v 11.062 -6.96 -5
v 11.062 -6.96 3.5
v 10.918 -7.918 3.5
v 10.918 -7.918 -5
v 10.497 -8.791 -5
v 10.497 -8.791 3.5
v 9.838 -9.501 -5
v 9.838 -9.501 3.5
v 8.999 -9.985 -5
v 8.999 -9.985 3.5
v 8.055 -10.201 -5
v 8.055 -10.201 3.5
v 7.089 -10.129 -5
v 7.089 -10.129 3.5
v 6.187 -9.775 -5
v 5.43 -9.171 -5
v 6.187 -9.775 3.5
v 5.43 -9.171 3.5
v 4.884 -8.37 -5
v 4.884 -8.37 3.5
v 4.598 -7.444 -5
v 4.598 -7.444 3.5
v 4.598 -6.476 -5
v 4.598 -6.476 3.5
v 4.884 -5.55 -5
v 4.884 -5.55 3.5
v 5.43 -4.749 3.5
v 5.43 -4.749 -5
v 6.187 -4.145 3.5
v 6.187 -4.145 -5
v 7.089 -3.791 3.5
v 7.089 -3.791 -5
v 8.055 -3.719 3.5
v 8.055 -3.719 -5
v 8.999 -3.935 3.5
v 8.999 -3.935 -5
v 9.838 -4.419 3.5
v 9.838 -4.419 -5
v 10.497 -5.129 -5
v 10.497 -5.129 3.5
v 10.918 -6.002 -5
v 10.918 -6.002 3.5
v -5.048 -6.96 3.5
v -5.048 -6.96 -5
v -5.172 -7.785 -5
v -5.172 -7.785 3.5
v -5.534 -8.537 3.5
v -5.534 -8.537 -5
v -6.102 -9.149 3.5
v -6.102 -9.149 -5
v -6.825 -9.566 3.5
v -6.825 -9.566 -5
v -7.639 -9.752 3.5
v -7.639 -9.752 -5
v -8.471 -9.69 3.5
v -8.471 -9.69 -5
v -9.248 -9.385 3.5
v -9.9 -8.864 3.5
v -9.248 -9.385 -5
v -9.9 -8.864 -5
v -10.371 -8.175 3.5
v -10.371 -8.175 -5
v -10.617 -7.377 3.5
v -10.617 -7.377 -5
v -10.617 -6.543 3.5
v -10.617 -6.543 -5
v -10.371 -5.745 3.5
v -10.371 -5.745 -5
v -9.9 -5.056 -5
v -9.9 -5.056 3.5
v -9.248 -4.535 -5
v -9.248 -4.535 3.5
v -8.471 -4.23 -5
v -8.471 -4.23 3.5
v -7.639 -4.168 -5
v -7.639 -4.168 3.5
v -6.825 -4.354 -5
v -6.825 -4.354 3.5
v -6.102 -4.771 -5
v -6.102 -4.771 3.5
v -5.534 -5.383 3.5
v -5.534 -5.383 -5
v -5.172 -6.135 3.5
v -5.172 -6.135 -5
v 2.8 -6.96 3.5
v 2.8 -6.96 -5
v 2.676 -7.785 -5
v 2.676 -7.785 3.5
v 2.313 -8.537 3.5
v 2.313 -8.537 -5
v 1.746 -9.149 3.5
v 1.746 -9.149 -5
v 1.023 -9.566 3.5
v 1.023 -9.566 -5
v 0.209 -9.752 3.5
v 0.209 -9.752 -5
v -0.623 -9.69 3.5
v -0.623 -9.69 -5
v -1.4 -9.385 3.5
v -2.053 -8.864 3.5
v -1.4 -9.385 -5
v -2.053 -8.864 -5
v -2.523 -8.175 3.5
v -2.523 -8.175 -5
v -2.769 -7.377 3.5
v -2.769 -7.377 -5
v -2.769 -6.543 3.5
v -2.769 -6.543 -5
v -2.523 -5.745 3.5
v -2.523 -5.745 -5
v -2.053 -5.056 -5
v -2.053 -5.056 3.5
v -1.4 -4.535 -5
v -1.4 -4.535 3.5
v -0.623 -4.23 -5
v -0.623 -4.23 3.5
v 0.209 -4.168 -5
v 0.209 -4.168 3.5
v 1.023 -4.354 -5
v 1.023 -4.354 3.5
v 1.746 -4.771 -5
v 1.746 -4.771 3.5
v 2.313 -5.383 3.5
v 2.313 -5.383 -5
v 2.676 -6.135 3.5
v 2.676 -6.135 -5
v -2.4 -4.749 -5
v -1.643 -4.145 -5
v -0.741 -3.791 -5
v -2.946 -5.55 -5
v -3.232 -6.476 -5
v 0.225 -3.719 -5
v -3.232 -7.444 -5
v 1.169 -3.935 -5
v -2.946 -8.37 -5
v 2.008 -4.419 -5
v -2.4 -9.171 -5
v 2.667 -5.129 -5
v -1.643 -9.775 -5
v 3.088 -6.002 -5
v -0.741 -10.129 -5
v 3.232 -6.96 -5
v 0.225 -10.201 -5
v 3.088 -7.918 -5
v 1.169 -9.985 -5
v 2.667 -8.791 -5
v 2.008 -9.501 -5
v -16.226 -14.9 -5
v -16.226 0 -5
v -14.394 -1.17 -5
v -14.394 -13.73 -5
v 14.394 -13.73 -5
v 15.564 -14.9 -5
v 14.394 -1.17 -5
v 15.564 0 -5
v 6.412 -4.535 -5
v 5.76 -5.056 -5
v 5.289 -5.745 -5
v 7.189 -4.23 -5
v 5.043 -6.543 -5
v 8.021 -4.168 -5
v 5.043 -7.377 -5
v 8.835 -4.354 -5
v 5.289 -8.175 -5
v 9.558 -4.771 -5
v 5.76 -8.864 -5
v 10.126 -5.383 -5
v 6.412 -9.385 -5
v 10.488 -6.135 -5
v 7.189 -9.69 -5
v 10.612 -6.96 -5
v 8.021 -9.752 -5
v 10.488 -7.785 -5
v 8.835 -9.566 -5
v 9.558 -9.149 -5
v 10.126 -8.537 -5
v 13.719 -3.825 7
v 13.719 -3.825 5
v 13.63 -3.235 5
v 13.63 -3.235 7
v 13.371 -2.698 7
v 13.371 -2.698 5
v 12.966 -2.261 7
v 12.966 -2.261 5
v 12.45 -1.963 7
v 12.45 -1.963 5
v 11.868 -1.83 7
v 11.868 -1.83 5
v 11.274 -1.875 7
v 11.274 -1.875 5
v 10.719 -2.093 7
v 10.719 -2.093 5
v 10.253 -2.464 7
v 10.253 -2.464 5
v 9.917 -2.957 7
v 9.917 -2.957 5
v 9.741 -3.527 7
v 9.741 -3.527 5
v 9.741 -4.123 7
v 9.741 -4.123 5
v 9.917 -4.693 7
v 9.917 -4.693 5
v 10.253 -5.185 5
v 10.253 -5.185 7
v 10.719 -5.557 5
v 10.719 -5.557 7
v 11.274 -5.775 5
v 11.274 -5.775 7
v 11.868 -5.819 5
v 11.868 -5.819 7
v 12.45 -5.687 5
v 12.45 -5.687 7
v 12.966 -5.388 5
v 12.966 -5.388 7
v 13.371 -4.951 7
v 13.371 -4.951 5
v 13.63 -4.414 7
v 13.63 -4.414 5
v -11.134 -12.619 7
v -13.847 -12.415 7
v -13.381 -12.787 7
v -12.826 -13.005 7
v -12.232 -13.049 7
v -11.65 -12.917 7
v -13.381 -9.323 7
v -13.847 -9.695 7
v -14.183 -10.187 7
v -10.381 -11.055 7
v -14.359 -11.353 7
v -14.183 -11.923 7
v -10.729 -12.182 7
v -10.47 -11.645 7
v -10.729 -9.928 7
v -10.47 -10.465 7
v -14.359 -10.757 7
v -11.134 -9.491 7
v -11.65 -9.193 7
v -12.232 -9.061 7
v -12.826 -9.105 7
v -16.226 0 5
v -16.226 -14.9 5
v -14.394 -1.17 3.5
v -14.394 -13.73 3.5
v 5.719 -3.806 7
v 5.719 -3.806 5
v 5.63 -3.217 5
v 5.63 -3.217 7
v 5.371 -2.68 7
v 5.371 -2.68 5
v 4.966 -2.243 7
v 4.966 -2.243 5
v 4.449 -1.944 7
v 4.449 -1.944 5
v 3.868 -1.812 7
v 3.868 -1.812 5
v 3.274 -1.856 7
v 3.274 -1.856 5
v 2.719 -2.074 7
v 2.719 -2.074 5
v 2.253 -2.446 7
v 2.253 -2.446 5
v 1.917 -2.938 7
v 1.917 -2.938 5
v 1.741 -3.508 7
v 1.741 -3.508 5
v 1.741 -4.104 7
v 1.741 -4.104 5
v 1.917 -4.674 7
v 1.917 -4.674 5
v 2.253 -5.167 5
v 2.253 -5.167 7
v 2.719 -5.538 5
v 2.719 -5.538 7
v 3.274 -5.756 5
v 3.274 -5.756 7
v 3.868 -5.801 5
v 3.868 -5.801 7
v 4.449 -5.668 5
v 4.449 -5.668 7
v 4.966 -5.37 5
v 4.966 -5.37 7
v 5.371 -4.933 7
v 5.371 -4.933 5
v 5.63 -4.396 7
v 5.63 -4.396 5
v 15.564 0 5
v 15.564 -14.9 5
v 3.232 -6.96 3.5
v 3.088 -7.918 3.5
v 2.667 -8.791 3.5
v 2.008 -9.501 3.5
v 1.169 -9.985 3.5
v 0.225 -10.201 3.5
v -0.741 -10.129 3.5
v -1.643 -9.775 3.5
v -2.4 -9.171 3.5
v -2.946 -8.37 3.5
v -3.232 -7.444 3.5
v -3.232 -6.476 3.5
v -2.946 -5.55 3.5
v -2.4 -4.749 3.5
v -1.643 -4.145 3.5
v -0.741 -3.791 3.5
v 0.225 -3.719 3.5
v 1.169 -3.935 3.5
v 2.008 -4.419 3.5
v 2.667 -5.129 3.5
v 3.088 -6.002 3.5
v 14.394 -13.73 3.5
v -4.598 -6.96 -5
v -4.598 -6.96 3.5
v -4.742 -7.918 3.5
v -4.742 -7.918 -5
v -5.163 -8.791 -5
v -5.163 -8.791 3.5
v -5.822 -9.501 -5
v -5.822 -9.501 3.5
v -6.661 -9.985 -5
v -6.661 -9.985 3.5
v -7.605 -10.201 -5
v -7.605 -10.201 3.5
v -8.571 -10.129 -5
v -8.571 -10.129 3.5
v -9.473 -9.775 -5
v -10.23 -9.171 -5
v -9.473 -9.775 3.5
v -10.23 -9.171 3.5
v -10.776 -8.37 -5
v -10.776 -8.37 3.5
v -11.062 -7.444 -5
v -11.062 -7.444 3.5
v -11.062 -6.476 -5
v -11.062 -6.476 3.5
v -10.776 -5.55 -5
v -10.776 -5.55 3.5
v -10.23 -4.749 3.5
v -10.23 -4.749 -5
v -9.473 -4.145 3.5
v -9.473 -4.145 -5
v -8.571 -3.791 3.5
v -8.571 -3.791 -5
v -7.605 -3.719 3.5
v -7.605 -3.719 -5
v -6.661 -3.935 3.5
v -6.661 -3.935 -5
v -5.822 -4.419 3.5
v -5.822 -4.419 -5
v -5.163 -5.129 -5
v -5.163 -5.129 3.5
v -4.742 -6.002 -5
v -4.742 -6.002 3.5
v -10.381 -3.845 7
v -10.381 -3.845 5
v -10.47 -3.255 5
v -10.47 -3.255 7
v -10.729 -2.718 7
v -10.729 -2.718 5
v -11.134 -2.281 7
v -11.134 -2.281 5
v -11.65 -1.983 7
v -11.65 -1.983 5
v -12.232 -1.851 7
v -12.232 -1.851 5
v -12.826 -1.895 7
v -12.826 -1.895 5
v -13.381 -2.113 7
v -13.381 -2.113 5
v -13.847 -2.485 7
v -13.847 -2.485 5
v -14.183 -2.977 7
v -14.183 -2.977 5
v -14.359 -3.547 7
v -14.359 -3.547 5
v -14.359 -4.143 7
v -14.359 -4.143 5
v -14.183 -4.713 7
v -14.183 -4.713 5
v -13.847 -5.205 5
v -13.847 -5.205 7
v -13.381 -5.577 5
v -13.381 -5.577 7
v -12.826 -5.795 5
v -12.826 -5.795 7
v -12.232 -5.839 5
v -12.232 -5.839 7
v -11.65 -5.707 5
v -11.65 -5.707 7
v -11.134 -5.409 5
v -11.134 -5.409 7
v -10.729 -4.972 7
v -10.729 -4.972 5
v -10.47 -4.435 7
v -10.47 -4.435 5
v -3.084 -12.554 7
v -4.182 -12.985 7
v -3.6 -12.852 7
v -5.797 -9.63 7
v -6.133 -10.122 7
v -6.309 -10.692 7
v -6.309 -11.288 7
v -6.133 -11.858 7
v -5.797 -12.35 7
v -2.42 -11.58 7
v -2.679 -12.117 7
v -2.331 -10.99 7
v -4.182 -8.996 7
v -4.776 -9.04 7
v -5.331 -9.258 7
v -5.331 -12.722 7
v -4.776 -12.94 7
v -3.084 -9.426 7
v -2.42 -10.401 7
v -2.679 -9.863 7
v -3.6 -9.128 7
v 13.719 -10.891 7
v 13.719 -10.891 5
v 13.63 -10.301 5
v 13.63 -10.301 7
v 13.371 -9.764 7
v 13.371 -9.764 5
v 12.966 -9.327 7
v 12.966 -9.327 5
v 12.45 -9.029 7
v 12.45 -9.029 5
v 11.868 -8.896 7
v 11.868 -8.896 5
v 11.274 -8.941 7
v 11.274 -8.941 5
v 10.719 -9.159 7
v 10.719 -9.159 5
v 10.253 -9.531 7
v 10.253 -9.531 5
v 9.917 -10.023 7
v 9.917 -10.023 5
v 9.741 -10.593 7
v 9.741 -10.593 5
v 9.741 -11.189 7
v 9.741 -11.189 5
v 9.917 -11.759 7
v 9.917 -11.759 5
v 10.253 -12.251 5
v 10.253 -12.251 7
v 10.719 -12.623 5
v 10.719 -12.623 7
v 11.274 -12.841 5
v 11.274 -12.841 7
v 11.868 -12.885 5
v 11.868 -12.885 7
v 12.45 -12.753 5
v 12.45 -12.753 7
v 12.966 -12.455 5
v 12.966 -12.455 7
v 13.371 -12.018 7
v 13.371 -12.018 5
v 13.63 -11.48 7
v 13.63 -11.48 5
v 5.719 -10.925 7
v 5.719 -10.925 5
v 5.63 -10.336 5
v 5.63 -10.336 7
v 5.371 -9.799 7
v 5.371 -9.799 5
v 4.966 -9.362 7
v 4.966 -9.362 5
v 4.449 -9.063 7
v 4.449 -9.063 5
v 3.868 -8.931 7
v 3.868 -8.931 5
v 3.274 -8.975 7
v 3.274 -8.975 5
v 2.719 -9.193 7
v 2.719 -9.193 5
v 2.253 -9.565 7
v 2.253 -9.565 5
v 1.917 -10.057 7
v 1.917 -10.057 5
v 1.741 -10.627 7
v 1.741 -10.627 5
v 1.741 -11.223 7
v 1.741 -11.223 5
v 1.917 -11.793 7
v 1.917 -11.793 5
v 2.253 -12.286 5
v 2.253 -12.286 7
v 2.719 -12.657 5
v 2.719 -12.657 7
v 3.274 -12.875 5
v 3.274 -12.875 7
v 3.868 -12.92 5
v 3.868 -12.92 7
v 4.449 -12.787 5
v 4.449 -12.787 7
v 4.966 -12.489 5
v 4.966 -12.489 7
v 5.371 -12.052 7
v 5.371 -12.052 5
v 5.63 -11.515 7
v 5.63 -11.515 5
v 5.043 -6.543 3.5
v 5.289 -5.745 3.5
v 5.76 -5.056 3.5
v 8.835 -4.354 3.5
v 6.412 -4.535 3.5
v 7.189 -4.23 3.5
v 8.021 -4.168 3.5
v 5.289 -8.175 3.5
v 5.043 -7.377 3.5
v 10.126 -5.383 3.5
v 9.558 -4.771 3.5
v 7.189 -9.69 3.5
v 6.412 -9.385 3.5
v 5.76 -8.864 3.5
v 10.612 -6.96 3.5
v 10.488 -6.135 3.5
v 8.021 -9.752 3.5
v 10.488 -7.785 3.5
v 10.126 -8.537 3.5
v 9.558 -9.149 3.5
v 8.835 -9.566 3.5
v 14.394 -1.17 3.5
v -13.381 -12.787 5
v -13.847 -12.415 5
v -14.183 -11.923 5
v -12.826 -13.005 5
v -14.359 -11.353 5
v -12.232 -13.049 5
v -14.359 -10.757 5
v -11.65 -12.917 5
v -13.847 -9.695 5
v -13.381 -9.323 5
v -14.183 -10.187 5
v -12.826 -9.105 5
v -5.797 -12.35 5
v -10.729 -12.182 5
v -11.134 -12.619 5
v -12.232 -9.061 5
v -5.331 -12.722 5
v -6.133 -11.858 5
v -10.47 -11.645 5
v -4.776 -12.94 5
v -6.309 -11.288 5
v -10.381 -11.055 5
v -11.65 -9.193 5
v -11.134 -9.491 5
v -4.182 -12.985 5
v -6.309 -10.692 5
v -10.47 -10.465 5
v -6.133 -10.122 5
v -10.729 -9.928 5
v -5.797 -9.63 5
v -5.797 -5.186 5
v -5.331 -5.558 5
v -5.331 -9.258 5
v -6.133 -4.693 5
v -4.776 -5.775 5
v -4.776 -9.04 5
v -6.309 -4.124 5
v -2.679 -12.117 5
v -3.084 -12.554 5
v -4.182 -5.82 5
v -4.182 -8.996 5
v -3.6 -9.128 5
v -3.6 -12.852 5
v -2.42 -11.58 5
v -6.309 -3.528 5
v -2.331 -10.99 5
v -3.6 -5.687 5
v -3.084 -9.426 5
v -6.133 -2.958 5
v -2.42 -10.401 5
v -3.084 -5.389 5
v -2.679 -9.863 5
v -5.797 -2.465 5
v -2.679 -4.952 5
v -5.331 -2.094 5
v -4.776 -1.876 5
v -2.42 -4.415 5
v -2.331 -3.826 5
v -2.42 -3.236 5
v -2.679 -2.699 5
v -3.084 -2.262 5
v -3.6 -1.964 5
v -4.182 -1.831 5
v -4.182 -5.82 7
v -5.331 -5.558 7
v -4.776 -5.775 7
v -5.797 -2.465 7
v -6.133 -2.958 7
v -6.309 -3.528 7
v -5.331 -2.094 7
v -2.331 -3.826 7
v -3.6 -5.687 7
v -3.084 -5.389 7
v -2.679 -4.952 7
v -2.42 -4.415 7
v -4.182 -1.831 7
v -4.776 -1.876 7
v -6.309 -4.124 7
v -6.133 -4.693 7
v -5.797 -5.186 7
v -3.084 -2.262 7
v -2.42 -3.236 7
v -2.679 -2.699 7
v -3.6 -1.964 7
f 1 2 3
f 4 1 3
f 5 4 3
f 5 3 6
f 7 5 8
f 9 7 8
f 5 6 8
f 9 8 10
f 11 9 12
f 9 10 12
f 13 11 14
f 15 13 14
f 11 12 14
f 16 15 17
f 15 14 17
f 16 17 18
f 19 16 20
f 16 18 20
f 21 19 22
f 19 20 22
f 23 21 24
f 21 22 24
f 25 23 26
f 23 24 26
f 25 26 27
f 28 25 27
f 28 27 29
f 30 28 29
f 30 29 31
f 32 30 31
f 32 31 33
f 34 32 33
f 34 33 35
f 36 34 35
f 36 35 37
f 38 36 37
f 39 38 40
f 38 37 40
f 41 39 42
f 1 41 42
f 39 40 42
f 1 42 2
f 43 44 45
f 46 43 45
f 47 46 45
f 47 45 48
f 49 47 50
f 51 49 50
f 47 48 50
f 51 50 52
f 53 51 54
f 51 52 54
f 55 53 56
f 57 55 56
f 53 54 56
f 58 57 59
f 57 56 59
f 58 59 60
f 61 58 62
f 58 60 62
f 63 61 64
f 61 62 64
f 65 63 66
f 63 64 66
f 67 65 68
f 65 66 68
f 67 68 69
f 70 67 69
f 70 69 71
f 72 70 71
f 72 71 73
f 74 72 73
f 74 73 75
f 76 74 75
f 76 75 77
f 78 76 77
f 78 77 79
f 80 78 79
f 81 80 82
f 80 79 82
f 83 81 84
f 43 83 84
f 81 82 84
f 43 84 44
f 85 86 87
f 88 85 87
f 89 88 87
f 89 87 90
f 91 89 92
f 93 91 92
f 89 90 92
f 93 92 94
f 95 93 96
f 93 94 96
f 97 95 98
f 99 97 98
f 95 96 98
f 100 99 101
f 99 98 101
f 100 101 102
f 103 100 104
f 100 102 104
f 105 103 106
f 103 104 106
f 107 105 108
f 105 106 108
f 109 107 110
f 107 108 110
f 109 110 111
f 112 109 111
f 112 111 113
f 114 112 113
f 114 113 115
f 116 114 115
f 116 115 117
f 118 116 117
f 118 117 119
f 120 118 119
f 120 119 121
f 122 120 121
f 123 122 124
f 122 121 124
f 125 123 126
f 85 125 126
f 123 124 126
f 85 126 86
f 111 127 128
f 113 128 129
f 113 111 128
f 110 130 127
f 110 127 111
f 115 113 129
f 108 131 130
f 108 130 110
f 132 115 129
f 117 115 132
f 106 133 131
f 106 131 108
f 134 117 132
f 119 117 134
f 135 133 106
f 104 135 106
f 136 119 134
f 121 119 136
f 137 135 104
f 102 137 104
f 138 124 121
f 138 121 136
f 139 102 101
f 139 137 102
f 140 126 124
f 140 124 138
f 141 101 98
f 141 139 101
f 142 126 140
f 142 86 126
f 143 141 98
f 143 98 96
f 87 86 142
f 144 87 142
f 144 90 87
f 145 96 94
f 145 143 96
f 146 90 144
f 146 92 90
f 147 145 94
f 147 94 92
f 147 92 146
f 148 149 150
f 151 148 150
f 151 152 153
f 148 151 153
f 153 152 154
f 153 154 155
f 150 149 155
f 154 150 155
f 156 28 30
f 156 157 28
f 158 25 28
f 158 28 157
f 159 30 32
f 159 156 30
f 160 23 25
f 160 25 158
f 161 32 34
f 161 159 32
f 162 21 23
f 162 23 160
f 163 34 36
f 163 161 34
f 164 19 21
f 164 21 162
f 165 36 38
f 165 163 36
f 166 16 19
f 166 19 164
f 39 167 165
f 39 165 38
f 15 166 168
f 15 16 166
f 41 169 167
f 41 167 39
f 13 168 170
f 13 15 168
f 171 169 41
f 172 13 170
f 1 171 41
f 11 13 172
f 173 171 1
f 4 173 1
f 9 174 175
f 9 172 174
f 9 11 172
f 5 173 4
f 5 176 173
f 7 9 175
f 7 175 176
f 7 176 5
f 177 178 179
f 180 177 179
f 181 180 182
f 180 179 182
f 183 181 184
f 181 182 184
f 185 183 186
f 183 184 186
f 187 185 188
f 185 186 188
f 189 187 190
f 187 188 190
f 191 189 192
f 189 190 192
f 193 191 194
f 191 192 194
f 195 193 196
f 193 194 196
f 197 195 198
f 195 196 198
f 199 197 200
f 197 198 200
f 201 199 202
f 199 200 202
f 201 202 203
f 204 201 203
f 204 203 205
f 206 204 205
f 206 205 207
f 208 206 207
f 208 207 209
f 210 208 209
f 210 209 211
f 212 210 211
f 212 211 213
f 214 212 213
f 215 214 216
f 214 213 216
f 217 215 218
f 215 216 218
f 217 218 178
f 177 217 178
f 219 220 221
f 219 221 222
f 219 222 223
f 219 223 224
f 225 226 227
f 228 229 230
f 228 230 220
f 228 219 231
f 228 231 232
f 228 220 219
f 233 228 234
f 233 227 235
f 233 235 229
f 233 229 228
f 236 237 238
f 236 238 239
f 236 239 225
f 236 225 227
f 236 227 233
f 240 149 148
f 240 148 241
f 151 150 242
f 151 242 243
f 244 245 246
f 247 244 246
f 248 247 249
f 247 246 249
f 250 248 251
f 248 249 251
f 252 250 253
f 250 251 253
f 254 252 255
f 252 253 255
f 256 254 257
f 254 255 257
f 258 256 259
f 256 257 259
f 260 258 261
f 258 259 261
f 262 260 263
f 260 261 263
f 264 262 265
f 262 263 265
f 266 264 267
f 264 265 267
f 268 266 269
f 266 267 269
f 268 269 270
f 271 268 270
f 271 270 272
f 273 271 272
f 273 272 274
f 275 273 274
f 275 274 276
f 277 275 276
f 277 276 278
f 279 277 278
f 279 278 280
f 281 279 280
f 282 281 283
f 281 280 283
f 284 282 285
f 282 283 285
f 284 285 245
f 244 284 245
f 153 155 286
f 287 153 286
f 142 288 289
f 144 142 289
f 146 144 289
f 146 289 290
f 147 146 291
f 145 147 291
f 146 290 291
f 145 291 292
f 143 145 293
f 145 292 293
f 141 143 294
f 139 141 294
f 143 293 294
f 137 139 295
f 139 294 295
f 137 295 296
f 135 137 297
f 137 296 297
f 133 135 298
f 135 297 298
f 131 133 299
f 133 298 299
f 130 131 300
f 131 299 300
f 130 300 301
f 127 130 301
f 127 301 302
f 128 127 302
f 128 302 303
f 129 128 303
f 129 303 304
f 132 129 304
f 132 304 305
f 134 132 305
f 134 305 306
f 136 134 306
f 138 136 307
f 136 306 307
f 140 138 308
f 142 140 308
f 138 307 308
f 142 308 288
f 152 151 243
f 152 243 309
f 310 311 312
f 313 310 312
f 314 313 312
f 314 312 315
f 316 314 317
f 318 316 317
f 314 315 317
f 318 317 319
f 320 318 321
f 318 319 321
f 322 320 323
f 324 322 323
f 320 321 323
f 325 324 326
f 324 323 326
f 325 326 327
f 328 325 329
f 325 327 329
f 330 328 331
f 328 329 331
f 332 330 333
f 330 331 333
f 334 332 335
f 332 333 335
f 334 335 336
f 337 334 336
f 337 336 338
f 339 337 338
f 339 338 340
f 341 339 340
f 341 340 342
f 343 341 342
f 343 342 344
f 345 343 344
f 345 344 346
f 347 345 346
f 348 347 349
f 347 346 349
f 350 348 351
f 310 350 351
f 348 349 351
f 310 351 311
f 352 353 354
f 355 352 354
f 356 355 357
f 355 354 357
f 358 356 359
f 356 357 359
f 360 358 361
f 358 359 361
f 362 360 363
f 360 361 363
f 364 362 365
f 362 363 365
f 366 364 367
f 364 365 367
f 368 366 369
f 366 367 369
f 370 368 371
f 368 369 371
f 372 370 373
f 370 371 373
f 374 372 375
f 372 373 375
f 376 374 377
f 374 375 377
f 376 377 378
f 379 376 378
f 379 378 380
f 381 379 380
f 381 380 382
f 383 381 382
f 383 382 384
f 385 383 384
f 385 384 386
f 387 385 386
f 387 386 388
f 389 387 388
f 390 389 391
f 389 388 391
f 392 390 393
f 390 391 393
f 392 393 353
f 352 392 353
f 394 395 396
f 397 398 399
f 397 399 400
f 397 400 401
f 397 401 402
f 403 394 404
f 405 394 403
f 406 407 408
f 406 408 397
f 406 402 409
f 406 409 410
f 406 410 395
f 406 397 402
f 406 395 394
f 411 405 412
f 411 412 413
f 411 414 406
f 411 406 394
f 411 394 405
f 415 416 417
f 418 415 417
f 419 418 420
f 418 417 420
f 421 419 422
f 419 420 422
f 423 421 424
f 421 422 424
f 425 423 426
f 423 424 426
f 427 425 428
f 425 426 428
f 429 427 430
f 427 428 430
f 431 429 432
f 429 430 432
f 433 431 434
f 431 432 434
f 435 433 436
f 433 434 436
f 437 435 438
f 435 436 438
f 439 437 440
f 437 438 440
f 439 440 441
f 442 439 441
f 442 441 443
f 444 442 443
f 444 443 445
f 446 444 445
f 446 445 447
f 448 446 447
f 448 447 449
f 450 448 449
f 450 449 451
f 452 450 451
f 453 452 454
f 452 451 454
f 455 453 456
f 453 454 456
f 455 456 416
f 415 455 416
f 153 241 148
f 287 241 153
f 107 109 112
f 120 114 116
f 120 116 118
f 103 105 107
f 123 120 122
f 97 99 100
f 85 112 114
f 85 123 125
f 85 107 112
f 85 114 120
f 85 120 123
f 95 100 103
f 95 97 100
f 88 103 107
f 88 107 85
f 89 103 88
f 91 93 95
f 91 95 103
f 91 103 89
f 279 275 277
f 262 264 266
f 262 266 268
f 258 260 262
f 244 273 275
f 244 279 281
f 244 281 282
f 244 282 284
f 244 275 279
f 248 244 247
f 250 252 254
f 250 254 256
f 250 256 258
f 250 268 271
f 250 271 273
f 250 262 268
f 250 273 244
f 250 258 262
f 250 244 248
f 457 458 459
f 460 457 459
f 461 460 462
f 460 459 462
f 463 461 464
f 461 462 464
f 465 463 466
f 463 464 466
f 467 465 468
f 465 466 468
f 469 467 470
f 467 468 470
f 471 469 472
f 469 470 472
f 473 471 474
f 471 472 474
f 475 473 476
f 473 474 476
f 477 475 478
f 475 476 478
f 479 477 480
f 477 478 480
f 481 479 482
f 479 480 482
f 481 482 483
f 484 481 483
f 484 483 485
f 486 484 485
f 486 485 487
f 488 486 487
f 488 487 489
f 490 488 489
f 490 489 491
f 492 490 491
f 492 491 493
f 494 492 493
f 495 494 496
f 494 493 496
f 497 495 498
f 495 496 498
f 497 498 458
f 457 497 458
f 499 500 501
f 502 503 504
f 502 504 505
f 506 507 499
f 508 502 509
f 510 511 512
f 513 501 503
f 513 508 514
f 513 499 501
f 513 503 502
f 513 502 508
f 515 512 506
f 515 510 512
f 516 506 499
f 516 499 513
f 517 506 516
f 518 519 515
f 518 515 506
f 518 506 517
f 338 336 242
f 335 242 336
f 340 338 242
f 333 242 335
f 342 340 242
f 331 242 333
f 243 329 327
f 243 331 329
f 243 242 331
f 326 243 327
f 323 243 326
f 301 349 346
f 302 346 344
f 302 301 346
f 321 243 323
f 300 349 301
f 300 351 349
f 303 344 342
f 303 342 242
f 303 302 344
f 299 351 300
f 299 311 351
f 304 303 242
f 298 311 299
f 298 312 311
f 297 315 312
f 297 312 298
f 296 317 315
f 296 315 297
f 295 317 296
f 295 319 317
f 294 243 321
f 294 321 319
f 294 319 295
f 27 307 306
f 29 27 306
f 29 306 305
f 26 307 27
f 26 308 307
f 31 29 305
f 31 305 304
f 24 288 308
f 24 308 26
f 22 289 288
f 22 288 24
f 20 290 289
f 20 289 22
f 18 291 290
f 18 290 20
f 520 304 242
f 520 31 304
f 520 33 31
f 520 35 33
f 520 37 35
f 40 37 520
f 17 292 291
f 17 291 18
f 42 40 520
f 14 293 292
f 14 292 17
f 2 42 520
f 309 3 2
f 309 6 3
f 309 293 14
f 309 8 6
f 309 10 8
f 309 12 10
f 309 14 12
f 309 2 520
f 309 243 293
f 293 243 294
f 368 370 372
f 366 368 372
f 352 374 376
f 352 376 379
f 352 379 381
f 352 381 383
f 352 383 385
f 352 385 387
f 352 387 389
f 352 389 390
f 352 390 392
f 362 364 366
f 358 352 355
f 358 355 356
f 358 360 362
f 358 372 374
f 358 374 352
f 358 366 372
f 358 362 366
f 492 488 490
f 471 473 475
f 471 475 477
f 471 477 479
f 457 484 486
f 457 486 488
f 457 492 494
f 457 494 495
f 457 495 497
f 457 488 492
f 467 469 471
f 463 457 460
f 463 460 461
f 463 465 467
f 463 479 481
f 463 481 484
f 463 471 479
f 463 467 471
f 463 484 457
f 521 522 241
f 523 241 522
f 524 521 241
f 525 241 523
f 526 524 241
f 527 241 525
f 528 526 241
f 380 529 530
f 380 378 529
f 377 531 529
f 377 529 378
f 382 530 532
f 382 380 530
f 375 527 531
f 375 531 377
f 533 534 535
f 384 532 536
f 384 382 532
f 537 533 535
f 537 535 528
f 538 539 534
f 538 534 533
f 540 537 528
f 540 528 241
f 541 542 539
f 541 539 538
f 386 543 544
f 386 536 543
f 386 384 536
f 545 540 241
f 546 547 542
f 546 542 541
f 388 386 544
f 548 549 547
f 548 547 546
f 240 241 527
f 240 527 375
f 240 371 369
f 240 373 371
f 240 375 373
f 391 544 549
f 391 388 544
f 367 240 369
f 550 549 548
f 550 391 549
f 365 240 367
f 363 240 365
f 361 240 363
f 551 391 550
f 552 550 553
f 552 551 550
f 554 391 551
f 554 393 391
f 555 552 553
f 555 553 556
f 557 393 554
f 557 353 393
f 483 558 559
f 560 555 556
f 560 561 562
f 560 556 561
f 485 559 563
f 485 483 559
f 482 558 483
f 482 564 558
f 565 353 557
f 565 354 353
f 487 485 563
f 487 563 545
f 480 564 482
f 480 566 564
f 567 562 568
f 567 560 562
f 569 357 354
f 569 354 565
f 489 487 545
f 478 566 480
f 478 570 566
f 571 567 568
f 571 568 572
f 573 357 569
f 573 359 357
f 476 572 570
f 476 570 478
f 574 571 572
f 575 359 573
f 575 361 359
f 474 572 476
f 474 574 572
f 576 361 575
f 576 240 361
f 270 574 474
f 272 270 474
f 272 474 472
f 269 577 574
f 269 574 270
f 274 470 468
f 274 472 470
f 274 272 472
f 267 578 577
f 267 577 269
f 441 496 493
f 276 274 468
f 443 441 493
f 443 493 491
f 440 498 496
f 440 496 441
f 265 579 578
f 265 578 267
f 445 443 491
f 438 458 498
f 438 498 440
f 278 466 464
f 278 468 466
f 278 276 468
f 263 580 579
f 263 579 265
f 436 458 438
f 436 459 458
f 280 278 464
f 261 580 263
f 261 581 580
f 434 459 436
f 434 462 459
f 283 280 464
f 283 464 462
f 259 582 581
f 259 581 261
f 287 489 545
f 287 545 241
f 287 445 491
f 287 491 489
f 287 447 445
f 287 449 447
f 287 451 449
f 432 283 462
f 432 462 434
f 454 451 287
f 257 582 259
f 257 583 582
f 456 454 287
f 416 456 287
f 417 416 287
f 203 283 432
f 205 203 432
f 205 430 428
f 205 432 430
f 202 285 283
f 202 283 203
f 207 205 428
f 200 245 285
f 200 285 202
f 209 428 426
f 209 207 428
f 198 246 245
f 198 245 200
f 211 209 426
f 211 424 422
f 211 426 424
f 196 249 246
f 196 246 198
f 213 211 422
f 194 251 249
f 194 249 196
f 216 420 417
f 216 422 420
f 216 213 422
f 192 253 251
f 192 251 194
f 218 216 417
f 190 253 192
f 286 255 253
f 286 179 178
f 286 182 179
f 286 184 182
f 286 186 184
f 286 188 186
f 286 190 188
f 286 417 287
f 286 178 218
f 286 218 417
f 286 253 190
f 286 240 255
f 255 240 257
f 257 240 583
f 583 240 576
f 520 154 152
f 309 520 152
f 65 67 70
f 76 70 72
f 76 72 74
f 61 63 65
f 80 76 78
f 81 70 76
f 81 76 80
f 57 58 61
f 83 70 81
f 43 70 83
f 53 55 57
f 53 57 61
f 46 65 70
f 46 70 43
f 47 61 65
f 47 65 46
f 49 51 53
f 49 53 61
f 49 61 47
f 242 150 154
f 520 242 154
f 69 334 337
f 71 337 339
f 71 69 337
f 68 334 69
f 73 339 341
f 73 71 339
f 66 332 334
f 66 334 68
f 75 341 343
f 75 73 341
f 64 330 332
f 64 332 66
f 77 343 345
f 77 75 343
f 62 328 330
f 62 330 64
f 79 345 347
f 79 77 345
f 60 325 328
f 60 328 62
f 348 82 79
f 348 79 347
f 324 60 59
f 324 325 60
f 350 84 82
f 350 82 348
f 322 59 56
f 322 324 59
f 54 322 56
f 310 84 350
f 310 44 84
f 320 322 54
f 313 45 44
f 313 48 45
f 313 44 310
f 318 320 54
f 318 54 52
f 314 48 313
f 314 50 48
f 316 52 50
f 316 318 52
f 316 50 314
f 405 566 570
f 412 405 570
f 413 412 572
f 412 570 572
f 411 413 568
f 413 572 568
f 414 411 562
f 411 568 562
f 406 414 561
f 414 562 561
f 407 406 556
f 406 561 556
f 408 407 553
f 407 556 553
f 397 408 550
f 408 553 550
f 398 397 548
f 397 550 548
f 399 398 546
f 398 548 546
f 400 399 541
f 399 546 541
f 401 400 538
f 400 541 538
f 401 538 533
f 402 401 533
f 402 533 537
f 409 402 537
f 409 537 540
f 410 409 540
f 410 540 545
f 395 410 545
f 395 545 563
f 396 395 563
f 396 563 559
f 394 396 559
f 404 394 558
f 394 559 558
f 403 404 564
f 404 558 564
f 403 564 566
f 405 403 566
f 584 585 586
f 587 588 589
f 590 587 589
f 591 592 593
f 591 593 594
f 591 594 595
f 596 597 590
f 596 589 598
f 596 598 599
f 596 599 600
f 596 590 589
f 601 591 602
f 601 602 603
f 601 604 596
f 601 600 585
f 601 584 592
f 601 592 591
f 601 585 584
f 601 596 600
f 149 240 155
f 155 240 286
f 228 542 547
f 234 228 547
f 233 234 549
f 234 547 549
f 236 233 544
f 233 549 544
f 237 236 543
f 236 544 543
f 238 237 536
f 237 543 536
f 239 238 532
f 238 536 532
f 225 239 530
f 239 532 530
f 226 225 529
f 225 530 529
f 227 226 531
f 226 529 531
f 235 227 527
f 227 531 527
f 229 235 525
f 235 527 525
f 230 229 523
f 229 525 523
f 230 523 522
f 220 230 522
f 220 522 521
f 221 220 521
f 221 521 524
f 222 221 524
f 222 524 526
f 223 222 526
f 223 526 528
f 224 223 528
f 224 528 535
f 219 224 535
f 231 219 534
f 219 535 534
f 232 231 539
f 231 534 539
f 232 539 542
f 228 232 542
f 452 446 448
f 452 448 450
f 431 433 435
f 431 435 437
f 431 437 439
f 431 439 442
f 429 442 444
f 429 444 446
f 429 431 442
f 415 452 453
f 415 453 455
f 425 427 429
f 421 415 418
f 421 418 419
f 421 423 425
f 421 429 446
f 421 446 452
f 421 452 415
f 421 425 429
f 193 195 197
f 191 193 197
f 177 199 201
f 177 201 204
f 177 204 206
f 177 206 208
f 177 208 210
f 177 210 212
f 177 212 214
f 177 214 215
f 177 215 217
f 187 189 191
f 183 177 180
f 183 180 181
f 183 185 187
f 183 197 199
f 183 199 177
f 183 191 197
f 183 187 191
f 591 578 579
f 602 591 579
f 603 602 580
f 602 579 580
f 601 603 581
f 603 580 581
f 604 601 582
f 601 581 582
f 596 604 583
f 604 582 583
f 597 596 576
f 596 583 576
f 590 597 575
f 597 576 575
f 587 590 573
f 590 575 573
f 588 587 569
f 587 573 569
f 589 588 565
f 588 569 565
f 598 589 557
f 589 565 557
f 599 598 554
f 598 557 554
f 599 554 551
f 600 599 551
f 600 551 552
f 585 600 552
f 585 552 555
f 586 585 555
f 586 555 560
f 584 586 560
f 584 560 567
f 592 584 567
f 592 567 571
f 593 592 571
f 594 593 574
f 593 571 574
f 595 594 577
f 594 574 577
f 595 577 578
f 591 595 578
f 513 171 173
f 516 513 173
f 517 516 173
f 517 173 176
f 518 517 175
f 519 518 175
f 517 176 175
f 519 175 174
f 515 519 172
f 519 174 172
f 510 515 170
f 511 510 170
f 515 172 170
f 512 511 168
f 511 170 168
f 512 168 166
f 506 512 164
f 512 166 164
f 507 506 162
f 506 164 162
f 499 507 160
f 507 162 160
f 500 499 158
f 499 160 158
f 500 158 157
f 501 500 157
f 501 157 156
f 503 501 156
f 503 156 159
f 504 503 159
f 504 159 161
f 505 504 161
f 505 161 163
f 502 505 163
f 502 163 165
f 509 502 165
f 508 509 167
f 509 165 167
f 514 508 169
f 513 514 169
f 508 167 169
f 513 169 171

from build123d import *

# Parameters (mm, degrees)
F0_W     = 31.79
F0_H     = 10
F1_DEPTH = 14.9
F2_W     = 28.787708
F2_H     = 12.56
F3_DEPTH = 8.5
F4_R     = 2
F5_DEPTH = 2
F6_R     = 3.25
F7_DEPTH = 8.5
F8_R     = 2.8
F9_DEPTH = 8.5


with BuildPart() as f1:
    # F0 (on Front) → F1 (new body)
    with BuildSketch(Plane.XZ):
        with Locations((-0.331146, 0)):
            Rectangle(F0_W, F0_H)
    extrude(amount=F1_DEPTH)

    # F2 (on face) → F3 (cut)
    with BuildSketch(Plane(origin=(0, 0, -5), x_dir=(1, 0, 0), z_dir=(0, 0, -1))):
        with Locations((0, 7.45)):
            Rectangle(F2_W, F2_H)
    extrude(amount=-F3_DEPTH, mode=Mode.SUBTRACT)

    # F4 (on face) → F5 (join)
    with BuildSketch(Plane.XY.offset(5)):
        with Locations((-12.381146, -3.845)):
            Circle(F4_R)
        with Locations((-4.331169, -3.825617)):
            Circle(F4_R)
        with Locations((3.718807, -3.806234)):
            Circle(F4_R)
        with Locations((11.718854, -3.824759)):
            Circle(F4_R)
        with Locations((-12.381146, -11.055)):
            Circle(F4_R)
        with Locations((-4.331169, -10.990121)):
            Circle(F4_R)
        with Locations((3.718807, -10.925242)):
            Circle(F4_R)
        with Locations((11.718854, -10.890886)):
            Circle(F4_R)
    extrude(amount=F5_DEPTH)

    # F6 (on face) → F7 (join)
    with BuildSketch(Plane(origin=(0, 0, 3.5), x_dir=(1, 0, 0), z_dir=(0, 0, -1))):
        with Locations((-0.017932, 6.96)):
            Circle(F6_R)
        with Locations((-7.847932, 6.96)):
            Circle(F6_R)
        with Locations((7.812068, 6.96)):
            Circle(F6_R)
    extrude(amount=F7_DEPTH)

    # F8 (on face) → F9 (cut)
    with BuildSketch(Plane(origin=(0, 0, -5), x_dir=(1, 0, 0), z_dir=(0, 0, -1))):
        with Locations((-7.847932, 6.96)):
            Circle(F8_R)
        with Locations((0, 6.96)):
            Circle(F8_R)
        with Locations((7.812068, 6.96)):
            Circle(F8_R)
    extrude(amount=-F9_DEPTH, mode=Mode.SUBTRACT)


solid = f1.part
